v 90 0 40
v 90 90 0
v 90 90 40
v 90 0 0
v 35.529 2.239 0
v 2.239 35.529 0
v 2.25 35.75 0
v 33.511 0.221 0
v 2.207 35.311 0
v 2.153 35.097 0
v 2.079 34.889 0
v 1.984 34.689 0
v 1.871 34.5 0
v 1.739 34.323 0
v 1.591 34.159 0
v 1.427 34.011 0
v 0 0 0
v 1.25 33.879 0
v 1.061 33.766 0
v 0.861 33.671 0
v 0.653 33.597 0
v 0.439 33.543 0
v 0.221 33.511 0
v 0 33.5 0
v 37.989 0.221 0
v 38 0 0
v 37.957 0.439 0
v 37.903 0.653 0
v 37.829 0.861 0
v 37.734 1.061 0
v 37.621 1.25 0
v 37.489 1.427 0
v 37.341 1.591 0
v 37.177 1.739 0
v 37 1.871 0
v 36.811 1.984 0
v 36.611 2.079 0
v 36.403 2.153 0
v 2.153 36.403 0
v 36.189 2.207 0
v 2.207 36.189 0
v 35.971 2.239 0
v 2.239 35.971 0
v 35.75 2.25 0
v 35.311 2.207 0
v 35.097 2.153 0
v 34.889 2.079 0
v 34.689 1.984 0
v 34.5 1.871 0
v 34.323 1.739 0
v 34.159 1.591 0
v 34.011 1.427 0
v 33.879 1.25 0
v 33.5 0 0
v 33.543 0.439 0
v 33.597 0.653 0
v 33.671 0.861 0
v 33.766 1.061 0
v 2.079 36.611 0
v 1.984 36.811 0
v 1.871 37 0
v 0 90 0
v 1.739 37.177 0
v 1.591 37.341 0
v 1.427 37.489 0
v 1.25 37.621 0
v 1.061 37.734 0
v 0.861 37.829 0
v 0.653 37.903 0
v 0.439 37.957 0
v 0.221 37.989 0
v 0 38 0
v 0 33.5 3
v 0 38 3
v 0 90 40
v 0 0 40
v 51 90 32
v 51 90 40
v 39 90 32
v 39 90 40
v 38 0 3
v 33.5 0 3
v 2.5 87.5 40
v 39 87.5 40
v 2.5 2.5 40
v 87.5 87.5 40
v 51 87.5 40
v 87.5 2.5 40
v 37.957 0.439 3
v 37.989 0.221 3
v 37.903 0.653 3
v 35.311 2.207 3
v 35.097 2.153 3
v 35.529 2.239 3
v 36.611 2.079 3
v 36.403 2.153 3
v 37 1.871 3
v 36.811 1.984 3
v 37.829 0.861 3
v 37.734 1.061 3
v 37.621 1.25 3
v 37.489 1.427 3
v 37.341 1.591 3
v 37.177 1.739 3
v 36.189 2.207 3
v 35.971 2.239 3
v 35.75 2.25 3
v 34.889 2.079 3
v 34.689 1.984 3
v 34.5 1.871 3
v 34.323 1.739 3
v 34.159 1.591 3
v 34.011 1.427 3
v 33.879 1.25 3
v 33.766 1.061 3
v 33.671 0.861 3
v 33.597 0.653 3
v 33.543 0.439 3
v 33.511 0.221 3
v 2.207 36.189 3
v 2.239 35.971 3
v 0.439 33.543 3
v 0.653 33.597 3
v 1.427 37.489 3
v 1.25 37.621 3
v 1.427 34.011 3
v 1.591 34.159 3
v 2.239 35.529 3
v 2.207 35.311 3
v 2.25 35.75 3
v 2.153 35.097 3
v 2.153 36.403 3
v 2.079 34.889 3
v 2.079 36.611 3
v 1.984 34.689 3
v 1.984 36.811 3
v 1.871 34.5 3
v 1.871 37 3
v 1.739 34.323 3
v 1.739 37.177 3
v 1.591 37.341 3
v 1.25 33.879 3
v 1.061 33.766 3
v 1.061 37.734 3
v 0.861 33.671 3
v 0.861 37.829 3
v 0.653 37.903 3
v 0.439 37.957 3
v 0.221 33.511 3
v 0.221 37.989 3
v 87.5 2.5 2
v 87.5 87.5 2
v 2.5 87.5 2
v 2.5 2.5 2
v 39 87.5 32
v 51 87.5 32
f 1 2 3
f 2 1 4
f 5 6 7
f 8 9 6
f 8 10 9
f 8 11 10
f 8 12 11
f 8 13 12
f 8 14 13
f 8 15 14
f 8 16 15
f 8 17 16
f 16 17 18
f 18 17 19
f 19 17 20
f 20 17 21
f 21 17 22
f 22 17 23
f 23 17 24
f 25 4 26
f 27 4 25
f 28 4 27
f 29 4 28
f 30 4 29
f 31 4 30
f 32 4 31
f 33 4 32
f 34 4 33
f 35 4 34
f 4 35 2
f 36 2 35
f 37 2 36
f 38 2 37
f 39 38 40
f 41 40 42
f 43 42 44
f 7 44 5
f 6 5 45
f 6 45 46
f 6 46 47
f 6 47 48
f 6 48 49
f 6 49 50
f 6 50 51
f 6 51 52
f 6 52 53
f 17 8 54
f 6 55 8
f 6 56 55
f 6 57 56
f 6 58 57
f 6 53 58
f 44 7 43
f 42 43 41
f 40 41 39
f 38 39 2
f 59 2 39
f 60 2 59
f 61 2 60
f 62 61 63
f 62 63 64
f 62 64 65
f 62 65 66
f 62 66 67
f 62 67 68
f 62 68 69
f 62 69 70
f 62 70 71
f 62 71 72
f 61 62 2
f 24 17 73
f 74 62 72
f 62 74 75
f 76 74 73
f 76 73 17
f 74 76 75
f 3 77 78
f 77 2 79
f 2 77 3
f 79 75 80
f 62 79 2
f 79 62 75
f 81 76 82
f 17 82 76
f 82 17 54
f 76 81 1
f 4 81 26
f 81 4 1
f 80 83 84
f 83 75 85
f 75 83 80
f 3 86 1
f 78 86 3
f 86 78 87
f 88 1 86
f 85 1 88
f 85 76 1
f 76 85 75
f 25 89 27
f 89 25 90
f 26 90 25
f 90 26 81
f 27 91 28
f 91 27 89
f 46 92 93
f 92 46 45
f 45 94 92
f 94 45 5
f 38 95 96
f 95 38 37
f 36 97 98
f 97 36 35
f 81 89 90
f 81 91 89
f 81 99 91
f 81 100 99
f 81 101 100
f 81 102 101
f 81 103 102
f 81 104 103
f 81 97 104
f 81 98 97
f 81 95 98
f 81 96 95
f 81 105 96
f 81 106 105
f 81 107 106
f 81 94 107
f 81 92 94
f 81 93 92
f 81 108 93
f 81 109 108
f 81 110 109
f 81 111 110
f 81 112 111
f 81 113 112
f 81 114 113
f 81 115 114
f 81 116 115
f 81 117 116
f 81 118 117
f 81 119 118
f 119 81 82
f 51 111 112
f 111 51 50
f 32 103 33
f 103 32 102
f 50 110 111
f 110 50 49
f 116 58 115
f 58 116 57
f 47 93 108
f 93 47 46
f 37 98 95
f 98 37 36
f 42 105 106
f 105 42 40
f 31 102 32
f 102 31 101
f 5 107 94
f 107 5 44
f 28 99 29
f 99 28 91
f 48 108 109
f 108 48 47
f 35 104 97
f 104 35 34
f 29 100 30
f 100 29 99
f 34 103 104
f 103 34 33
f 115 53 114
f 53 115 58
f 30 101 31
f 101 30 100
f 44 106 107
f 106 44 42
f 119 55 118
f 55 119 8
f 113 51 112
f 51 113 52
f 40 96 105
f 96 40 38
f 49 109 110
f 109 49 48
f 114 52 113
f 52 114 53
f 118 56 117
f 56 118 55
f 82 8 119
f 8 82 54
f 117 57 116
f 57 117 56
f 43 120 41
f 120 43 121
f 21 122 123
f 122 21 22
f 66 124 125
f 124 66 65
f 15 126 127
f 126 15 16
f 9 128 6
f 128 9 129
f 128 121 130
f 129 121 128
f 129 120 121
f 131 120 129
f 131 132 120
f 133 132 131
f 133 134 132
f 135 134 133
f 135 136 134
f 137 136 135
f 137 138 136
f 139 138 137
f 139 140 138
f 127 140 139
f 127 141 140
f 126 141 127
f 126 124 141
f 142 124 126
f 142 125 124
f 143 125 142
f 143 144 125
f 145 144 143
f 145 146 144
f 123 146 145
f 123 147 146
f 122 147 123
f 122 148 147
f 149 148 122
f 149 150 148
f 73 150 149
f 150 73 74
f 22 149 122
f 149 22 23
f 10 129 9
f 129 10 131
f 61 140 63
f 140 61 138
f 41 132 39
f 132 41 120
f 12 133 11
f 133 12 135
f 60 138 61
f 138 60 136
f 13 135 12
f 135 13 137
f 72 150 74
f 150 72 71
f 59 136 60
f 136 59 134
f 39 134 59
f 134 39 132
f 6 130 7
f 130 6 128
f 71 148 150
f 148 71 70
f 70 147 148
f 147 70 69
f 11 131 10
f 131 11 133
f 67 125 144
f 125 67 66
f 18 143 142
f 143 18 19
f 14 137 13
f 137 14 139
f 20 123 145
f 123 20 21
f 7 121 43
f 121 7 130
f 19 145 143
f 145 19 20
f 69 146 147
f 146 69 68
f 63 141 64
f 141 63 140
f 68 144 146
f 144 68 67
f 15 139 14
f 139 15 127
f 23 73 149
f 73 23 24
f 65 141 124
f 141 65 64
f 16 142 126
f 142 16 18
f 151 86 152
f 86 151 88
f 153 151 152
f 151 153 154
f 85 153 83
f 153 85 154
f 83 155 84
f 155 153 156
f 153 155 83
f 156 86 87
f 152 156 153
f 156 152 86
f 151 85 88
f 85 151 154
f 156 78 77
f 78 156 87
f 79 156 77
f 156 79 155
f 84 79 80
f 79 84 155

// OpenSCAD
// Housing for a DIY magnetic stirrer built around an 80 mm PC case fan
// Printed upside down: top plate on the bed, box open at the top.

$fn = 64;

// ---- Dimensions (mm) ----
top_t      = 2;    // top plate thickness (z = 0 to 2)
wall_t     = 2.5;  // wall thickness
box_h      = 40;   // total height of box walls (open top at z = 40)
outer_x    = 90;   // outer size along X
outer_y    = 90;   // outer size along Y
screw_n    = 4;    // number of screw holes
screw_d    = 4.5;  // screw hole diameter (M4)
screw_pitch = 71.5;// square pitch of screw holes (X and Y)
cable_w    = 12;   // width of power-cable notch
cable_reach = 8;   // notch depth from open edge (z = 32 to 40)

// ---- Model ----
difference() {
    // Outer box
    union() {
        cube([outer_x, outer_y, top_t]);           // top plate
        cube([outer_x, outer_y, box_h]);           // walls (overlaps plate)
    }

    // Inner cavity, leaving the specified wall thickness
    translate([wall_t, wall_t, top_t])
        cube([outer_x - 2 * wall_t, outer_y - 2 * wall_t, box_h - top_t]);

    // M4 screw holes through the top plate
    for (i = [0 : screw_n - 1])
        rotate([0, 0, 90 * i])
            translate([screw_pitch / 2, 0, -1])
                cylinder(d = screw_d, h = top_t + 2, $fn = 64);

    // Power-cable notch in one wall (12 mm wide, from z = 32 to 40)
    translate([outer_x / 2 - cable_w / 2, outer_y / 2, box_h - cable_reach])
        cube([cable_w, outer_y, cable_reach]);
}
